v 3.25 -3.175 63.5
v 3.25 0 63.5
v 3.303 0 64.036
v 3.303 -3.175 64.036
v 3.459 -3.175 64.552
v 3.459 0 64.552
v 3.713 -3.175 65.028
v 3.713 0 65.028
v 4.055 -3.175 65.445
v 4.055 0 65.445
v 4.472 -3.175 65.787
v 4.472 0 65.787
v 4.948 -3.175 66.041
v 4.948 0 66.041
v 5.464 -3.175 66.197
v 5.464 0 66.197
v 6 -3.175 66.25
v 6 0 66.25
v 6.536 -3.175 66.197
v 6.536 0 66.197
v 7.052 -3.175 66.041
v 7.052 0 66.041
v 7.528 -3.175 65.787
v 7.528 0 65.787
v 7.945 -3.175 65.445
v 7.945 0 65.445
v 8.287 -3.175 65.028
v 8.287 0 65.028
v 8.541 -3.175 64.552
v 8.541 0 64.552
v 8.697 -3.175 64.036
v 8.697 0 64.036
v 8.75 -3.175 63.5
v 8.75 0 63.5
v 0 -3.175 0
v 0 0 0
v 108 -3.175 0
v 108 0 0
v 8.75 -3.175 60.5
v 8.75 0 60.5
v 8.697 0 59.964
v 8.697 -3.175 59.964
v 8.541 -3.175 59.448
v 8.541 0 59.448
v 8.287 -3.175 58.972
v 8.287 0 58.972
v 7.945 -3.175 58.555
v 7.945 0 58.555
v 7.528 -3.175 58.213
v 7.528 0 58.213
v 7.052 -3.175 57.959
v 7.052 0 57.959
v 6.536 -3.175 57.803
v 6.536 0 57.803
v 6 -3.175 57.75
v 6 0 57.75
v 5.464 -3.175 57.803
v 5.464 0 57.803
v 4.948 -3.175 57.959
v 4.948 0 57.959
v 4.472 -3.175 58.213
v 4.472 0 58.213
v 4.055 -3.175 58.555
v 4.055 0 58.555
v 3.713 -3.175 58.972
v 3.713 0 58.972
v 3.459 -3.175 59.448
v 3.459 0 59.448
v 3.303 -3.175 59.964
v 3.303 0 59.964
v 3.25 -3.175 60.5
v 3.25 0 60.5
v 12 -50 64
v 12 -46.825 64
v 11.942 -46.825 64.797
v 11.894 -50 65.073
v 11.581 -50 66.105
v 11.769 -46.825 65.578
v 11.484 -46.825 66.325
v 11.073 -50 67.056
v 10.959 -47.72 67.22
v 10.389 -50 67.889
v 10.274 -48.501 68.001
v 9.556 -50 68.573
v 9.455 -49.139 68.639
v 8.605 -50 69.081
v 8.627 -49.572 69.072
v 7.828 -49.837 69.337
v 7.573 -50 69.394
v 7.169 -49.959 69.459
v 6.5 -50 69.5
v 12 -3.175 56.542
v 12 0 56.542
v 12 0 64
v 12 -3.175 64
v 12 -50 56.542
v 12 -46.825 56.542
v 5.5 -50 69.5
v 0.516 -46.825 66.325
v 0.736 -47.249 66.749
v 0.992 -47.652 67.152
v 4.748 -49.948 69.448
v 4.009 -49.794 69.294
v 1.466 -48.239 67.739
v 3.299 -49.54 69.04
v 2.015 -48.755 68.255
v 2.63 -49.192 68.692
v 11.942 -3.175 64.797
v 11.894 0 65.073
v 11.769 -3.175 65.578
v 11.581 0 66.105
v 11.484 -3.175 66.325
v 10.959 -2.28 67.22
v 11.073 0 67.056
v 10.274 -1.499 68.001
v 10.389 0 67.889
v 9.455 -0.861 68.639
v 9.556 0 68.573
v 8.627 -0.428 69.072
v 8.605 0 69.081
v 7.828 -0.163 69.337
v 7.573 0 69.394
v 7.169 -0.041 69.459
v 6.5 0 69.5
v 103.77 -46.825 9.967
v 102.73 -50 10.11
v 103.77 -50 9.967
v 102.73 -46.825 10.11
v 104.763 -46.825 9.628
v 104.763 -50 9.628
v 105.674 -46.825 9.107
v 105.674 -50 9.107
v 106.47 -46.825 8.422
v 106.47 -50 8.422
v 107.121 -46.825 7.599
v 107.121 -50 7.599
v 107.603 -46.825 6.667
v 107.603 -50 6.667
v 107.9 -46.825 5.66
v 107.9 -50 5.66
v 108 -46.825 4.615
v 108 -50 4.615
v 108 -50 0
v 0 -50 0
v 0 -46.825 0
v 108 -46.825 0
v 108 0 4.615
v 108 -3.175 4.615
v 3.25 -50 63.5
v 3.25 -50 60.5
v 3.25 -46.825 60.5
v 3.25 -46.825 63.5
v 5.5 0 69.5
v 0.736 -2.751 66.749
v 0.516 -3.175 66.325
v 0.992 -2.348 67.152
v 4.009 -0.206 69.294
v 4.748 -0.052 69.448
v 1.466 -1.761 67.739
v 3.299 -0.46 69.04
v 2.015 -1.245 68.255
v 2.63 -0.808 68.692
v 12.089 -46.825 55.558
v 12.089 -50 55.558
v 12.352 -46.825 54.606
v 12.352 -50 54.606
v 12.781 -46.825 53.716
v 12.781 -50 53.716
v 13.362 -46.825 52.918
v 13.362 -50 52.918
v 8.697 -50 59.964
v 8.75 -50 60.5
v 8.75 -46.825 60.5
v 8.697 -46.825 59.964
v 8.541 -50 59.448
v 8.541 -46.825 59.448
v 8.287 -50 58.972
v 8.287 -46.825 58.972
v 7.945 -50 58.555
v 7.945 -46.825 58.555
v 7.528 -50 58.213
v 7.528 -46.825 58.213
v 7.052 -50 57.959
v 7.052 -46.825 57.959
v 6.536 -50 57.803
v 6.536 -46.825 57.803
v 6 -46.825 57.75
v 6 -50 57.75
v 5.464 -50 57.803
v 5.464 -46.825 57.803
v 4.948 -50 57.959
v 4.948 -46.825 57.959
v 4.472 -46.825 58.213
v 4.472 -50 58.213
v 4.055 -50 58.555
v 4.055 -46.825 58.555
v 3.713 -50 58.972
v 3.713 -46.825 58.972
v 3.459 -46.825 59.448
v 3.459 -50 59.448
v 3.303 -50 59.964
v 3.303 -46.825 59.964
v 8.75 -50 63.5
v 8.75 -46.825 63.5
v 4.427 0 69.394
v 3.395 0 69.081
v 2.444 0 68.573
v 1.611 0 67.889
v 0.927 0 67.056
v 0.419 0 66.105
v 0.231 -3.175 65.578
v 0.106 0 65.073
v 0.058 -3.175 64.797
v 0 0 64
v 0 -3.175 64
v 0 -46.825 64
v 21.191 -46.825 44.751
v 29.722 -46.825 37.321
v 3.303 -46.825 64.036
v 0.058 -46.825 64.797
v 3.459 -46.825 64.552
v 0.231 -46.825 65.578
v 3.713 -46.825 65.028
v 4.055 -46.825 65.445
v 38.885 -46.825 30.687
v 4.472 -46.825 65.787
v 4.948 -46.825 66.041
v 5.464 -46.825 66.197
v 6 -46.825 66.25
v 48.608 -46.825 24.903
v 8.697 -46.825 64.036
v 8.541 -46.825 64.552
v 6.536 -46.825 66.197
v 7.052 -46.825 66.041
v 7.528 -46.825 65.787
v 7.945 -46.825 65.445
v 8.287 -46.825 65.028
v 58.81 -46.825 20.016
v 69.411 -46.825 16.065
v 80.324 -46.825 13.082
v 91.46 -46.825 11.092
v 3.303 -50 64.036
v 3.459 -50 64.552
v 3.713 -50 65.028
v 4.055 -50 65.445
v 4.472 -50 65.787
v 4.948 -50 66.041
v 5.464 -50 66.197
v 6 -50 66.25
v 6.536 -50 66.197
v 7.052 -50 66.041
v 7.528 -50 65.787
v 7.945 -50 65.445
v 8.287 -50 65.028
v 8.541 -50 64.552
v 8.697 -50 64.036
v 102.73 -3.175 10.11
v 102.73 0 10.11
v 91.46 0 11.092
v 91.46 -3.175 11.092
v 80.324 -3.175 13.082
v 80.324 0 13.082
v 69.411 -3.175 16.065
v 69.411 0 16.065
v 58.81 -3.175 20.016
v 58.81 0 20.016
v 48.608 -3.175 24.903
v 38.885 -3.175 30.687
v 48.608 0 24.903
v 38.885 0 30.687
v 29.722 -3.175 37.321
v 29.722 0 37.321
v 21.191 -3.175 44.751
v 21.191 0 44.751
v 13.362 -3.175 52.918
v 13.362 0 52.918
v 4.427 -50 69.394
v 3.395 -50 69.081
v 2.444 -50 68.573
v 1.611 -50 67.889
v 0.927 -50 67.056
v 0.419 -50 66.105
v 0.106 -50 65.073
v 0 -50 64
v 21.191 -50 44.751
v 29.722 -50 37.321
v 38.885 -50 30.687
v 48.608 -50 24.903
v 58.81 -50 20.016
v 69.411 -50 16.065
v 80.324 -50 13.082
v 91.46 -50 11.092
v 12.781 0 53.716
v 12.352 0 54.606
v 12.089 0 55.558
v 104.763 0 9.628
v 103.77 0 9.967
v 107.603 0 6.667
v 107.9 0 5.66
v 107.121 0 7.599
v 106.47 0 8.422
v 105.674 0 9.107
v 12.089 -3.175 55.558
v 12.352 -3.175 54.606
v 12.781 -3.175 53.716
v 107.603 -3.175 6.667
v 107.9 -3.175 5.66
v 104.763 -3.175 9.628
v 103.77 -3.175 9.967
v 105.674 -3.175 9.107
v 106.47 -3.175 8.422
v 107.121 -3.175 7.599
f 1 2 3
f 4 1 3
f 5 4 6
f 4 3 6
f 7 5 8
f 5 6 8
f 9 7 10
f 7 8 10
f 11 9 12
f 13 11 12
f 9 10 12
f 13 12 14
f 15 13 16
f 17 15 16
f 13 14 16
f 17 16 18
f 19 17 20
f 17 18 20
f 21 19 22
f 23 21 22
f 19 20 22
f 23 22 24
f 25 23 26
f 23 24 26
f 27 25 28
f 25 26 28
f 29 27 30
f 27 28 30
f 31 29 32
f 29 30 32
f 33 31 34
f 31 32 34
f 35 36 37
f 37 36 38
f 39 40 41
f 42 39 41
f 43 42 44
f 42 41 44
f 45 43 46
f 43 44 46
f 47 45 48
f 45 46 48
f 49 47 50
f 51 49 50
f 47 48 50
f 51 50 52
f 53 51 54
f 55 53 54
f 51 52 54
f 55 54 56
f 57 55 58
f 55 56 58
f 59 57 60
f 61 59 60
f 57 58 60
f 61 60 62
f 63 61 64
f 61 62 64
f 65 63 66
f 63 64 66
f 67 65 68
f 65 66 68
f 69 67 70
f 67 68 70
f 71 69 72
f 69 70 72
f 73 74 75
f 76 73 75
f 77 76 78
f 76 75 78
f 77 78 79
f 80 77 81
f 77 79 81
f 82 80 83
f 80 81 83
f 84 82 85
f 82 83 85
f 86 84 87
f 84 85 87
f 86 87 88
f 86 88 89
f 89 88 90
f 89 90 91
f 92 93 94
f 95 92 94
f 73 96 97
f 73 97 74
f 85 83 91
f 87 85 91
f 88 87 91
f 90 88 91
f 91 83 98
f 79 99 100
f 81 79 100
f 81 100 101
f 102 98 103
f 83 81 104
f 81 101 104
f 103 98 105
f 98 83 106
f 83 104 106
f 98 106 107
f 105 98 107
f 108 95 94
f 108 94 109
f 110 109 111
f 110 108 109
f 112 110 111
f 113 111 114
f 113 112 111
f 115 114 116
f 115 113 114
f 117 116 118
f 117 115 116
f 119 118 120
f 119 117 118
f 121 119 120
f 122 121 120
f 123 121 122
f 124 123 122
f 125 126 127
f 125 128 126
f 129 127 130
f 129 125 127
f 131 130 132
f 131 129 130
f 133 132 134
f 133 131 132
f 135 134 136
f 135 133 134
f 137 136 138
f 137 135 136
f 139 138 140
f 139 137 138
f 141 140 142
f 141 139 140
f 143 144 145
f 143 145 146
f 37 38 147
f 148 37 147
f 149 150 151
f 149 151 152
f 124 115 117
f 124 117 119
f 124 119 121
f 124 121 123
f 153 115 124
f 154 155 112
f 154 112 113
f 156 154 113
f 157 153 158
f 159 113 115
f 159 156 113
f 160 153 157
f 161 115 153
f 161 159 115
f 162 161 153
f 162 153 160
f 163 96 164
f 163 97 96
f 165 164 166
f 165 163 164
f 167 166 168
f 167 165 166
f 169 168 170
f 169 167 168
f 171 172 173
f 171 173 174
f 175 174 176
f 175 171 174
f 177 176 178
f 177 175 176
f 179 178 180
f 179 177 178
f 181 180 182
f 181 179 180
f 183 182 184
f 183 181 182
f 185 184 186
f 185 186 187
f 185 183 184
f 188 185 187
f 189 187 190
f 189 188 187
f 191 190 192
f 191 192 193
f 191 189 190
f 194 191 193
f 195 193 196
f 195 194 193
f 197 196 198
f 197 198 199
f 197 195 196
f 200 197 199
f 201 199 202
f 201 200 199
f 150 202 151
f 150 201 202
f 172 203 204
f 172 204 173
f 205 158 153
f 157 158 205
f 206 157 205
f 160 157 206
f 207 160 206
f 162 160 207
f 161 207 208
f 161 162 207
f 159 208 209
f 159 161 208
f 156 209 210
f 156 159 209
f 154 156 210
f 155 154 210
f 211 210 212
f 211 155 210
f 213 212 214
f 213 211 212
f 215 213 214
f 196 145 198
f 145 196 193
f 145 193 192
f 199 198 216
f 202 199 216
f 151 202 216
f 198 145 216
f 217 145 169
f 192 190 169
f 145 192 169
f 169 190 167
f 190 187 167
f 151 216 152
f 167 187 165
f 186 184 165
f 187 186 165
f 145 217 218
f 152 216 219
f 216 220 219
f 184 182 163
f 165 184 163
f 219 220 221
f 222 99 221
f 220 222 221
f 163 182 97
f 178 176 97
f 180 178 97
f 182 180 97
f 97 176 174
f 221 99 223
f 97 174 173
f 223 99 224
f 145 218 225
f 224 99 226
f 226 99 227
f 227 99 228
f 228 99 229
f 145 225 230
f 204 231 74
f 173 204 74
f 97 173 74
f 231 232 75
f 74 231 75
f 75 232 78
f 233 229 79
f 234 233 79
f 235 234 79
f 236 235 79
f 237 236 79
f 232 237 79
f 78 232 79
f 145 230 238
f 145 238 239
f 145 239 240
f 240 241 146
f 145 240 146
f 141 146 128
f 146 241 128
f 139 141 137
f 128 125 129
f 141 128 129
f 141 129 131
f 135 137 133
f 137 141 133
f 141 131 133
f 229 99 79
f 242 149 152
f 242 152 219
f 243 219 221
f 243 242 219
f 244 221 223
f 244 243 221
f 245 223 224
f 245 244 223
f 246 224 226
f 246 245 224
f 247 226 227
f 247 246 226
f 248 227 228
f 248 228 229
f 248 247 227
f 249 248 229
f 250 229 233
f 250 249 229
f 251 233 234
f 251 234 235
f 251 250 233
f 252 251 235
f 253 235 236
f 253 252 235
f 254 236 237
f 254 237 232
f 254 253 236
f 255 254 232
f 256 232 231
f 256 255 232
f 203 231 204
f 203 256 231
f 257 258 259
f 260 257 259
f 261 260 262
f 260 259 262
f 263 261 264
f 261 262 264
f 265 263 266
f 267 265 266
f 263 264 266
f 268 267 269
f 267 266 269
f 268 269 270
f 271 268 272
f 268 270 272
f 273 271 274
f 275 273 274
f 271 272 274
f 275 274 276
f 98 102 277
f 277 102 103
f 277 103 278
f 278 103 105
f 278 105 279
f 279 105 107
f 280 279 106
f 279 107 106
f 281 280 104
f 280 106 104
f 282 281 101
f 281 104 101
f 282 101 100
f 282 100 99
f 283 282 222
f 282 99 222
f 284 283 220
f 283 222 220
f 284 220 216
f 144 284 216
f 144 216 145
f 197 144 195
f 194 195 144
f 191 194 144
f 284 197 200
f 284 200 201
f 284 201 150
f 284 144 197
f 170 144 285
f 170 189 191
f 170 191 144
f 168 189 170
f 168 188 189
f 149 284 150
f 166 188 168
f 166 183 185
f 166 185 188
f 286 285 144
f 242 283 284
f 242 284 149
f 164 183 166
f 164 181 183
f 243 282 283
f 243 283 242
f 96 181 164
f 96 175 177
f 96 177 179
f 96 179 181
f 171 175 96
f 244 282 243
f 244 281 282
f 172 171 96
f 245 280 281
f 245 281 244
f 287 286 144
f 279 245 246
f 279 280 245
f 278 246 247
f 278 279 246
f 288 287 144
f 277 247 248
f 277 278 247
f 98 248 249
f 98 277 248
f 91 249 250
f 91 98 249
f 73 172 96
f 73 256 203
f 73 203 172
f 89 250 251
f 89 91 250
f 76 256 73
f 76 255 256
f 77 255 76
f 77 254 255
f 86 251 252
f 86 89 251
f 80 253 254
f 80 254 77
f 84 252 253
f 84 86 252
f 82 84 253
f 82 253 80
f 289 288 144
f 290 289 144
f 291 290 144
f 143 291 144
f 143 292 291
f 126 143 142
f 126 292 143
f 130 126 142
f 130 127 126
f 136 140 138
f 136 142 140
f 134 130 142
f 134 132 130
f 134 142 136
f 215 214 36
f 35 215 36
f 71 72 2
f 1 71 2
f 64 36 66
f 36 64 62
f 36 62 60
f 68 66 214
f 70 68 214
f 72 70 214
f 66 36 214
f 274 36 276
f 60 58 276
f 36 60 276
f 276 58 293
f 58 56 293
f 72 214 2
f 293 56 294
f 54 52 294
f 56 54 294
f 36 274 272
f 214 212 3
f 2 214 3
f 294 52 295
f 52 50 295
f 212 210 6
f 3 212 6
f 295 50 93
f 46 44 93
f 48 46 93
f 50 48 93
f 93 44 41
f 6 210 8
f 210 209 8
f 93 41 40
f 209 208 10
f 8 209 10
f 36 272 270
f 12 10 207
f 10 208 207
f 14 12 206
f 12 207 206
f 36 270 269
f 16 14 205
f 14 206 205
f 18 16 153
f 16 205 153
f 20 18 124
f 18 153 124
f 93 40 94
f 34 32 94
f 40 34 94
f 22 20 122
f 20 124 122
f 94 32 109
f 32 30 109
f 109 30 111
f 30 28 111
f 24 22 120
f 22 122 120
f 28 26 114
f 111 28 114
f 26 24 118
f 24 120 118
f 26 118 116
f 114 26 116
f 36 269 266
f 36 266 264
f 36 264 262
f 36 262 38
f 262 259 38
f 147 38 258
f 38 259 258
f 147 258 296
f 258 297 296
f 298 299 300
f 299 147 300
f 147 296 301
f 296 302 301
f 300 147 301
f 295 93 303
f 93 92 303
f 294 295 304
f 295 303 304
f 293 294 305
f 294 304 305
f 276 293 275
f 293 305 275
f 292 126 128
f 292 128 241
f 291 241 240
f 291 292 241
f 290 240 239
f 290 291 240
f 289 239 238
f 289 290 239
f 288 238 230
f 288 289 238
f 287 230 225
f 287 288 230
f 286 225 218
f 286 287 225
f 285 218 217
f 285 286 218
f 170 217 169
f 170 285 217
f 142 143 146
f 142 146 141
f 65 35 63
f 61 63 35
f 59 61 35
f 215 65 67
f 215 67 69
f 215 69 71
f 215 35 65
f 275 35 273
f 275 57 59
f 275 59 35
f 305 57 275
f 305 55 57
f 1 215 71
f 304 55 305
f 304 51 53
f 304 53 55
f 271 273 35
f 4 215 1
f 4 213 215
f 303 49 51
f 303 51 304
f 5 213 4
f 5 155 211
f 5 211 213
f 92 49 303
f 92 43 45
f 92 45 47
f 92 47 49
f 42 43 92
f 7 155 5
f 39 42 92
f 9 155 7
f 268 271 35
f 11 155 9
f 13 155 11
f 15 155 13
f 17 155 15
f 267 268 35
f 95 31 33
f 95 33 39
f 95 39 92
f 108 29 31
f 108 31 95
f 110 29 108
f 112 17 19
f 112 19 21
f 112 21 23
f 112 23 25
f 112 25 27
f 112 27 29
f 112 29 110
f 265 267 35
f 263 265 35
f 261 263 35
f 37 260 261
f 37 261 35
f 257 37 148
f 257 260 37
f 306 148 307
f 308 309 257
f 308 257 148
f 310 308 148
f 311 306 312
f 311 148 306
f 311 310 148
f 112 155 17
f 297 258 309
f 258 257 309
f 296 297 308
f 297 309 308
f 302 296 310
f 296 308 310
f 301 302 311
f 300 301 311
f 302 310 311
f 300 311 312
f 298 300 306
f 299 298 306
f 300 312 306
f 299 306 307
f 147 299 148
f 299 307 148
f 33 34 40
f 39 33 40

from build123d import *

# Parameters (mm, degrees)
F1_DEPTH      = 3.175
F2_R          = 5.5
F4_DEPTH      = 169
F4_DEPTH_BACK = 108.001


# Not quite as in the source:
# - an extrude ends at something that could not be found from the text; its depth is read off the source's solid
# - a feature names something its author has since deleted; it is built from what else it names


with BuildPart() as f1:
    # F0 (on Front) → F1 (new body)
    with BuildSketch(Plane.XZ):
        with BuildLine():
            Line((12, 54.5), (12, 69.5))
            Line((12, 69.5), (0, 69.5))
            Line((0, 69.5), (0, 0))
            Line((0, 0), (108, 0))
            Line((108, 0), (108, 10))
            ThreePointArc((108, 10), (55.0938330627, 21.6659095285), (12, 54.5))
        make_face()
        with BuildLine():
            ThreePointArc((3.25, 63.5), (6, 66.25), (8.75, 63.5))
            Line((8.75, 63.5), (8.75, 60.5))
            ThreePointArc((8.75, 60.5), (6, 57.75), (3.25, 60.5))
            Line((3.25, 60.5), (3.25, 63.5))
        make_face(mode=Mode.SUBTRACT)
    extrude(amount=F1_DEPTH)

    # F2
    f2_edges = [f1.edges().sort_by_distance(p)[0] for p in [
        (0, -1.5875, 69.5),
        (12, -1.5875, 54.5),
        (108, -1.5875, 10),
        (12, -1.5875, 69.5),
    ]]
    fillet(f2_edges, radius=F2_R)

    # F3 (on Right) → F4 (cut, two sides)
    with BuildSketch(Plane.YZ) as f4_sk:
        Polygon((0, 69.5), (-3.175, 69.5), (-3.175, 66.325), align=None)
    extrude(amount=-F4_DEPTH, mode=Mode.SUBTRACT)
    extrude(f4_sk.sketch, amount=F4_DEPTH_BACK, mode=Mode.SUBTRACT)


with BuildPart() as f6_1:
    # F6: instance of F1
    add(f1.part.mirror(Plane.XZ.offset(25)))


solid = Compound([f1.part, f6_1.part])
